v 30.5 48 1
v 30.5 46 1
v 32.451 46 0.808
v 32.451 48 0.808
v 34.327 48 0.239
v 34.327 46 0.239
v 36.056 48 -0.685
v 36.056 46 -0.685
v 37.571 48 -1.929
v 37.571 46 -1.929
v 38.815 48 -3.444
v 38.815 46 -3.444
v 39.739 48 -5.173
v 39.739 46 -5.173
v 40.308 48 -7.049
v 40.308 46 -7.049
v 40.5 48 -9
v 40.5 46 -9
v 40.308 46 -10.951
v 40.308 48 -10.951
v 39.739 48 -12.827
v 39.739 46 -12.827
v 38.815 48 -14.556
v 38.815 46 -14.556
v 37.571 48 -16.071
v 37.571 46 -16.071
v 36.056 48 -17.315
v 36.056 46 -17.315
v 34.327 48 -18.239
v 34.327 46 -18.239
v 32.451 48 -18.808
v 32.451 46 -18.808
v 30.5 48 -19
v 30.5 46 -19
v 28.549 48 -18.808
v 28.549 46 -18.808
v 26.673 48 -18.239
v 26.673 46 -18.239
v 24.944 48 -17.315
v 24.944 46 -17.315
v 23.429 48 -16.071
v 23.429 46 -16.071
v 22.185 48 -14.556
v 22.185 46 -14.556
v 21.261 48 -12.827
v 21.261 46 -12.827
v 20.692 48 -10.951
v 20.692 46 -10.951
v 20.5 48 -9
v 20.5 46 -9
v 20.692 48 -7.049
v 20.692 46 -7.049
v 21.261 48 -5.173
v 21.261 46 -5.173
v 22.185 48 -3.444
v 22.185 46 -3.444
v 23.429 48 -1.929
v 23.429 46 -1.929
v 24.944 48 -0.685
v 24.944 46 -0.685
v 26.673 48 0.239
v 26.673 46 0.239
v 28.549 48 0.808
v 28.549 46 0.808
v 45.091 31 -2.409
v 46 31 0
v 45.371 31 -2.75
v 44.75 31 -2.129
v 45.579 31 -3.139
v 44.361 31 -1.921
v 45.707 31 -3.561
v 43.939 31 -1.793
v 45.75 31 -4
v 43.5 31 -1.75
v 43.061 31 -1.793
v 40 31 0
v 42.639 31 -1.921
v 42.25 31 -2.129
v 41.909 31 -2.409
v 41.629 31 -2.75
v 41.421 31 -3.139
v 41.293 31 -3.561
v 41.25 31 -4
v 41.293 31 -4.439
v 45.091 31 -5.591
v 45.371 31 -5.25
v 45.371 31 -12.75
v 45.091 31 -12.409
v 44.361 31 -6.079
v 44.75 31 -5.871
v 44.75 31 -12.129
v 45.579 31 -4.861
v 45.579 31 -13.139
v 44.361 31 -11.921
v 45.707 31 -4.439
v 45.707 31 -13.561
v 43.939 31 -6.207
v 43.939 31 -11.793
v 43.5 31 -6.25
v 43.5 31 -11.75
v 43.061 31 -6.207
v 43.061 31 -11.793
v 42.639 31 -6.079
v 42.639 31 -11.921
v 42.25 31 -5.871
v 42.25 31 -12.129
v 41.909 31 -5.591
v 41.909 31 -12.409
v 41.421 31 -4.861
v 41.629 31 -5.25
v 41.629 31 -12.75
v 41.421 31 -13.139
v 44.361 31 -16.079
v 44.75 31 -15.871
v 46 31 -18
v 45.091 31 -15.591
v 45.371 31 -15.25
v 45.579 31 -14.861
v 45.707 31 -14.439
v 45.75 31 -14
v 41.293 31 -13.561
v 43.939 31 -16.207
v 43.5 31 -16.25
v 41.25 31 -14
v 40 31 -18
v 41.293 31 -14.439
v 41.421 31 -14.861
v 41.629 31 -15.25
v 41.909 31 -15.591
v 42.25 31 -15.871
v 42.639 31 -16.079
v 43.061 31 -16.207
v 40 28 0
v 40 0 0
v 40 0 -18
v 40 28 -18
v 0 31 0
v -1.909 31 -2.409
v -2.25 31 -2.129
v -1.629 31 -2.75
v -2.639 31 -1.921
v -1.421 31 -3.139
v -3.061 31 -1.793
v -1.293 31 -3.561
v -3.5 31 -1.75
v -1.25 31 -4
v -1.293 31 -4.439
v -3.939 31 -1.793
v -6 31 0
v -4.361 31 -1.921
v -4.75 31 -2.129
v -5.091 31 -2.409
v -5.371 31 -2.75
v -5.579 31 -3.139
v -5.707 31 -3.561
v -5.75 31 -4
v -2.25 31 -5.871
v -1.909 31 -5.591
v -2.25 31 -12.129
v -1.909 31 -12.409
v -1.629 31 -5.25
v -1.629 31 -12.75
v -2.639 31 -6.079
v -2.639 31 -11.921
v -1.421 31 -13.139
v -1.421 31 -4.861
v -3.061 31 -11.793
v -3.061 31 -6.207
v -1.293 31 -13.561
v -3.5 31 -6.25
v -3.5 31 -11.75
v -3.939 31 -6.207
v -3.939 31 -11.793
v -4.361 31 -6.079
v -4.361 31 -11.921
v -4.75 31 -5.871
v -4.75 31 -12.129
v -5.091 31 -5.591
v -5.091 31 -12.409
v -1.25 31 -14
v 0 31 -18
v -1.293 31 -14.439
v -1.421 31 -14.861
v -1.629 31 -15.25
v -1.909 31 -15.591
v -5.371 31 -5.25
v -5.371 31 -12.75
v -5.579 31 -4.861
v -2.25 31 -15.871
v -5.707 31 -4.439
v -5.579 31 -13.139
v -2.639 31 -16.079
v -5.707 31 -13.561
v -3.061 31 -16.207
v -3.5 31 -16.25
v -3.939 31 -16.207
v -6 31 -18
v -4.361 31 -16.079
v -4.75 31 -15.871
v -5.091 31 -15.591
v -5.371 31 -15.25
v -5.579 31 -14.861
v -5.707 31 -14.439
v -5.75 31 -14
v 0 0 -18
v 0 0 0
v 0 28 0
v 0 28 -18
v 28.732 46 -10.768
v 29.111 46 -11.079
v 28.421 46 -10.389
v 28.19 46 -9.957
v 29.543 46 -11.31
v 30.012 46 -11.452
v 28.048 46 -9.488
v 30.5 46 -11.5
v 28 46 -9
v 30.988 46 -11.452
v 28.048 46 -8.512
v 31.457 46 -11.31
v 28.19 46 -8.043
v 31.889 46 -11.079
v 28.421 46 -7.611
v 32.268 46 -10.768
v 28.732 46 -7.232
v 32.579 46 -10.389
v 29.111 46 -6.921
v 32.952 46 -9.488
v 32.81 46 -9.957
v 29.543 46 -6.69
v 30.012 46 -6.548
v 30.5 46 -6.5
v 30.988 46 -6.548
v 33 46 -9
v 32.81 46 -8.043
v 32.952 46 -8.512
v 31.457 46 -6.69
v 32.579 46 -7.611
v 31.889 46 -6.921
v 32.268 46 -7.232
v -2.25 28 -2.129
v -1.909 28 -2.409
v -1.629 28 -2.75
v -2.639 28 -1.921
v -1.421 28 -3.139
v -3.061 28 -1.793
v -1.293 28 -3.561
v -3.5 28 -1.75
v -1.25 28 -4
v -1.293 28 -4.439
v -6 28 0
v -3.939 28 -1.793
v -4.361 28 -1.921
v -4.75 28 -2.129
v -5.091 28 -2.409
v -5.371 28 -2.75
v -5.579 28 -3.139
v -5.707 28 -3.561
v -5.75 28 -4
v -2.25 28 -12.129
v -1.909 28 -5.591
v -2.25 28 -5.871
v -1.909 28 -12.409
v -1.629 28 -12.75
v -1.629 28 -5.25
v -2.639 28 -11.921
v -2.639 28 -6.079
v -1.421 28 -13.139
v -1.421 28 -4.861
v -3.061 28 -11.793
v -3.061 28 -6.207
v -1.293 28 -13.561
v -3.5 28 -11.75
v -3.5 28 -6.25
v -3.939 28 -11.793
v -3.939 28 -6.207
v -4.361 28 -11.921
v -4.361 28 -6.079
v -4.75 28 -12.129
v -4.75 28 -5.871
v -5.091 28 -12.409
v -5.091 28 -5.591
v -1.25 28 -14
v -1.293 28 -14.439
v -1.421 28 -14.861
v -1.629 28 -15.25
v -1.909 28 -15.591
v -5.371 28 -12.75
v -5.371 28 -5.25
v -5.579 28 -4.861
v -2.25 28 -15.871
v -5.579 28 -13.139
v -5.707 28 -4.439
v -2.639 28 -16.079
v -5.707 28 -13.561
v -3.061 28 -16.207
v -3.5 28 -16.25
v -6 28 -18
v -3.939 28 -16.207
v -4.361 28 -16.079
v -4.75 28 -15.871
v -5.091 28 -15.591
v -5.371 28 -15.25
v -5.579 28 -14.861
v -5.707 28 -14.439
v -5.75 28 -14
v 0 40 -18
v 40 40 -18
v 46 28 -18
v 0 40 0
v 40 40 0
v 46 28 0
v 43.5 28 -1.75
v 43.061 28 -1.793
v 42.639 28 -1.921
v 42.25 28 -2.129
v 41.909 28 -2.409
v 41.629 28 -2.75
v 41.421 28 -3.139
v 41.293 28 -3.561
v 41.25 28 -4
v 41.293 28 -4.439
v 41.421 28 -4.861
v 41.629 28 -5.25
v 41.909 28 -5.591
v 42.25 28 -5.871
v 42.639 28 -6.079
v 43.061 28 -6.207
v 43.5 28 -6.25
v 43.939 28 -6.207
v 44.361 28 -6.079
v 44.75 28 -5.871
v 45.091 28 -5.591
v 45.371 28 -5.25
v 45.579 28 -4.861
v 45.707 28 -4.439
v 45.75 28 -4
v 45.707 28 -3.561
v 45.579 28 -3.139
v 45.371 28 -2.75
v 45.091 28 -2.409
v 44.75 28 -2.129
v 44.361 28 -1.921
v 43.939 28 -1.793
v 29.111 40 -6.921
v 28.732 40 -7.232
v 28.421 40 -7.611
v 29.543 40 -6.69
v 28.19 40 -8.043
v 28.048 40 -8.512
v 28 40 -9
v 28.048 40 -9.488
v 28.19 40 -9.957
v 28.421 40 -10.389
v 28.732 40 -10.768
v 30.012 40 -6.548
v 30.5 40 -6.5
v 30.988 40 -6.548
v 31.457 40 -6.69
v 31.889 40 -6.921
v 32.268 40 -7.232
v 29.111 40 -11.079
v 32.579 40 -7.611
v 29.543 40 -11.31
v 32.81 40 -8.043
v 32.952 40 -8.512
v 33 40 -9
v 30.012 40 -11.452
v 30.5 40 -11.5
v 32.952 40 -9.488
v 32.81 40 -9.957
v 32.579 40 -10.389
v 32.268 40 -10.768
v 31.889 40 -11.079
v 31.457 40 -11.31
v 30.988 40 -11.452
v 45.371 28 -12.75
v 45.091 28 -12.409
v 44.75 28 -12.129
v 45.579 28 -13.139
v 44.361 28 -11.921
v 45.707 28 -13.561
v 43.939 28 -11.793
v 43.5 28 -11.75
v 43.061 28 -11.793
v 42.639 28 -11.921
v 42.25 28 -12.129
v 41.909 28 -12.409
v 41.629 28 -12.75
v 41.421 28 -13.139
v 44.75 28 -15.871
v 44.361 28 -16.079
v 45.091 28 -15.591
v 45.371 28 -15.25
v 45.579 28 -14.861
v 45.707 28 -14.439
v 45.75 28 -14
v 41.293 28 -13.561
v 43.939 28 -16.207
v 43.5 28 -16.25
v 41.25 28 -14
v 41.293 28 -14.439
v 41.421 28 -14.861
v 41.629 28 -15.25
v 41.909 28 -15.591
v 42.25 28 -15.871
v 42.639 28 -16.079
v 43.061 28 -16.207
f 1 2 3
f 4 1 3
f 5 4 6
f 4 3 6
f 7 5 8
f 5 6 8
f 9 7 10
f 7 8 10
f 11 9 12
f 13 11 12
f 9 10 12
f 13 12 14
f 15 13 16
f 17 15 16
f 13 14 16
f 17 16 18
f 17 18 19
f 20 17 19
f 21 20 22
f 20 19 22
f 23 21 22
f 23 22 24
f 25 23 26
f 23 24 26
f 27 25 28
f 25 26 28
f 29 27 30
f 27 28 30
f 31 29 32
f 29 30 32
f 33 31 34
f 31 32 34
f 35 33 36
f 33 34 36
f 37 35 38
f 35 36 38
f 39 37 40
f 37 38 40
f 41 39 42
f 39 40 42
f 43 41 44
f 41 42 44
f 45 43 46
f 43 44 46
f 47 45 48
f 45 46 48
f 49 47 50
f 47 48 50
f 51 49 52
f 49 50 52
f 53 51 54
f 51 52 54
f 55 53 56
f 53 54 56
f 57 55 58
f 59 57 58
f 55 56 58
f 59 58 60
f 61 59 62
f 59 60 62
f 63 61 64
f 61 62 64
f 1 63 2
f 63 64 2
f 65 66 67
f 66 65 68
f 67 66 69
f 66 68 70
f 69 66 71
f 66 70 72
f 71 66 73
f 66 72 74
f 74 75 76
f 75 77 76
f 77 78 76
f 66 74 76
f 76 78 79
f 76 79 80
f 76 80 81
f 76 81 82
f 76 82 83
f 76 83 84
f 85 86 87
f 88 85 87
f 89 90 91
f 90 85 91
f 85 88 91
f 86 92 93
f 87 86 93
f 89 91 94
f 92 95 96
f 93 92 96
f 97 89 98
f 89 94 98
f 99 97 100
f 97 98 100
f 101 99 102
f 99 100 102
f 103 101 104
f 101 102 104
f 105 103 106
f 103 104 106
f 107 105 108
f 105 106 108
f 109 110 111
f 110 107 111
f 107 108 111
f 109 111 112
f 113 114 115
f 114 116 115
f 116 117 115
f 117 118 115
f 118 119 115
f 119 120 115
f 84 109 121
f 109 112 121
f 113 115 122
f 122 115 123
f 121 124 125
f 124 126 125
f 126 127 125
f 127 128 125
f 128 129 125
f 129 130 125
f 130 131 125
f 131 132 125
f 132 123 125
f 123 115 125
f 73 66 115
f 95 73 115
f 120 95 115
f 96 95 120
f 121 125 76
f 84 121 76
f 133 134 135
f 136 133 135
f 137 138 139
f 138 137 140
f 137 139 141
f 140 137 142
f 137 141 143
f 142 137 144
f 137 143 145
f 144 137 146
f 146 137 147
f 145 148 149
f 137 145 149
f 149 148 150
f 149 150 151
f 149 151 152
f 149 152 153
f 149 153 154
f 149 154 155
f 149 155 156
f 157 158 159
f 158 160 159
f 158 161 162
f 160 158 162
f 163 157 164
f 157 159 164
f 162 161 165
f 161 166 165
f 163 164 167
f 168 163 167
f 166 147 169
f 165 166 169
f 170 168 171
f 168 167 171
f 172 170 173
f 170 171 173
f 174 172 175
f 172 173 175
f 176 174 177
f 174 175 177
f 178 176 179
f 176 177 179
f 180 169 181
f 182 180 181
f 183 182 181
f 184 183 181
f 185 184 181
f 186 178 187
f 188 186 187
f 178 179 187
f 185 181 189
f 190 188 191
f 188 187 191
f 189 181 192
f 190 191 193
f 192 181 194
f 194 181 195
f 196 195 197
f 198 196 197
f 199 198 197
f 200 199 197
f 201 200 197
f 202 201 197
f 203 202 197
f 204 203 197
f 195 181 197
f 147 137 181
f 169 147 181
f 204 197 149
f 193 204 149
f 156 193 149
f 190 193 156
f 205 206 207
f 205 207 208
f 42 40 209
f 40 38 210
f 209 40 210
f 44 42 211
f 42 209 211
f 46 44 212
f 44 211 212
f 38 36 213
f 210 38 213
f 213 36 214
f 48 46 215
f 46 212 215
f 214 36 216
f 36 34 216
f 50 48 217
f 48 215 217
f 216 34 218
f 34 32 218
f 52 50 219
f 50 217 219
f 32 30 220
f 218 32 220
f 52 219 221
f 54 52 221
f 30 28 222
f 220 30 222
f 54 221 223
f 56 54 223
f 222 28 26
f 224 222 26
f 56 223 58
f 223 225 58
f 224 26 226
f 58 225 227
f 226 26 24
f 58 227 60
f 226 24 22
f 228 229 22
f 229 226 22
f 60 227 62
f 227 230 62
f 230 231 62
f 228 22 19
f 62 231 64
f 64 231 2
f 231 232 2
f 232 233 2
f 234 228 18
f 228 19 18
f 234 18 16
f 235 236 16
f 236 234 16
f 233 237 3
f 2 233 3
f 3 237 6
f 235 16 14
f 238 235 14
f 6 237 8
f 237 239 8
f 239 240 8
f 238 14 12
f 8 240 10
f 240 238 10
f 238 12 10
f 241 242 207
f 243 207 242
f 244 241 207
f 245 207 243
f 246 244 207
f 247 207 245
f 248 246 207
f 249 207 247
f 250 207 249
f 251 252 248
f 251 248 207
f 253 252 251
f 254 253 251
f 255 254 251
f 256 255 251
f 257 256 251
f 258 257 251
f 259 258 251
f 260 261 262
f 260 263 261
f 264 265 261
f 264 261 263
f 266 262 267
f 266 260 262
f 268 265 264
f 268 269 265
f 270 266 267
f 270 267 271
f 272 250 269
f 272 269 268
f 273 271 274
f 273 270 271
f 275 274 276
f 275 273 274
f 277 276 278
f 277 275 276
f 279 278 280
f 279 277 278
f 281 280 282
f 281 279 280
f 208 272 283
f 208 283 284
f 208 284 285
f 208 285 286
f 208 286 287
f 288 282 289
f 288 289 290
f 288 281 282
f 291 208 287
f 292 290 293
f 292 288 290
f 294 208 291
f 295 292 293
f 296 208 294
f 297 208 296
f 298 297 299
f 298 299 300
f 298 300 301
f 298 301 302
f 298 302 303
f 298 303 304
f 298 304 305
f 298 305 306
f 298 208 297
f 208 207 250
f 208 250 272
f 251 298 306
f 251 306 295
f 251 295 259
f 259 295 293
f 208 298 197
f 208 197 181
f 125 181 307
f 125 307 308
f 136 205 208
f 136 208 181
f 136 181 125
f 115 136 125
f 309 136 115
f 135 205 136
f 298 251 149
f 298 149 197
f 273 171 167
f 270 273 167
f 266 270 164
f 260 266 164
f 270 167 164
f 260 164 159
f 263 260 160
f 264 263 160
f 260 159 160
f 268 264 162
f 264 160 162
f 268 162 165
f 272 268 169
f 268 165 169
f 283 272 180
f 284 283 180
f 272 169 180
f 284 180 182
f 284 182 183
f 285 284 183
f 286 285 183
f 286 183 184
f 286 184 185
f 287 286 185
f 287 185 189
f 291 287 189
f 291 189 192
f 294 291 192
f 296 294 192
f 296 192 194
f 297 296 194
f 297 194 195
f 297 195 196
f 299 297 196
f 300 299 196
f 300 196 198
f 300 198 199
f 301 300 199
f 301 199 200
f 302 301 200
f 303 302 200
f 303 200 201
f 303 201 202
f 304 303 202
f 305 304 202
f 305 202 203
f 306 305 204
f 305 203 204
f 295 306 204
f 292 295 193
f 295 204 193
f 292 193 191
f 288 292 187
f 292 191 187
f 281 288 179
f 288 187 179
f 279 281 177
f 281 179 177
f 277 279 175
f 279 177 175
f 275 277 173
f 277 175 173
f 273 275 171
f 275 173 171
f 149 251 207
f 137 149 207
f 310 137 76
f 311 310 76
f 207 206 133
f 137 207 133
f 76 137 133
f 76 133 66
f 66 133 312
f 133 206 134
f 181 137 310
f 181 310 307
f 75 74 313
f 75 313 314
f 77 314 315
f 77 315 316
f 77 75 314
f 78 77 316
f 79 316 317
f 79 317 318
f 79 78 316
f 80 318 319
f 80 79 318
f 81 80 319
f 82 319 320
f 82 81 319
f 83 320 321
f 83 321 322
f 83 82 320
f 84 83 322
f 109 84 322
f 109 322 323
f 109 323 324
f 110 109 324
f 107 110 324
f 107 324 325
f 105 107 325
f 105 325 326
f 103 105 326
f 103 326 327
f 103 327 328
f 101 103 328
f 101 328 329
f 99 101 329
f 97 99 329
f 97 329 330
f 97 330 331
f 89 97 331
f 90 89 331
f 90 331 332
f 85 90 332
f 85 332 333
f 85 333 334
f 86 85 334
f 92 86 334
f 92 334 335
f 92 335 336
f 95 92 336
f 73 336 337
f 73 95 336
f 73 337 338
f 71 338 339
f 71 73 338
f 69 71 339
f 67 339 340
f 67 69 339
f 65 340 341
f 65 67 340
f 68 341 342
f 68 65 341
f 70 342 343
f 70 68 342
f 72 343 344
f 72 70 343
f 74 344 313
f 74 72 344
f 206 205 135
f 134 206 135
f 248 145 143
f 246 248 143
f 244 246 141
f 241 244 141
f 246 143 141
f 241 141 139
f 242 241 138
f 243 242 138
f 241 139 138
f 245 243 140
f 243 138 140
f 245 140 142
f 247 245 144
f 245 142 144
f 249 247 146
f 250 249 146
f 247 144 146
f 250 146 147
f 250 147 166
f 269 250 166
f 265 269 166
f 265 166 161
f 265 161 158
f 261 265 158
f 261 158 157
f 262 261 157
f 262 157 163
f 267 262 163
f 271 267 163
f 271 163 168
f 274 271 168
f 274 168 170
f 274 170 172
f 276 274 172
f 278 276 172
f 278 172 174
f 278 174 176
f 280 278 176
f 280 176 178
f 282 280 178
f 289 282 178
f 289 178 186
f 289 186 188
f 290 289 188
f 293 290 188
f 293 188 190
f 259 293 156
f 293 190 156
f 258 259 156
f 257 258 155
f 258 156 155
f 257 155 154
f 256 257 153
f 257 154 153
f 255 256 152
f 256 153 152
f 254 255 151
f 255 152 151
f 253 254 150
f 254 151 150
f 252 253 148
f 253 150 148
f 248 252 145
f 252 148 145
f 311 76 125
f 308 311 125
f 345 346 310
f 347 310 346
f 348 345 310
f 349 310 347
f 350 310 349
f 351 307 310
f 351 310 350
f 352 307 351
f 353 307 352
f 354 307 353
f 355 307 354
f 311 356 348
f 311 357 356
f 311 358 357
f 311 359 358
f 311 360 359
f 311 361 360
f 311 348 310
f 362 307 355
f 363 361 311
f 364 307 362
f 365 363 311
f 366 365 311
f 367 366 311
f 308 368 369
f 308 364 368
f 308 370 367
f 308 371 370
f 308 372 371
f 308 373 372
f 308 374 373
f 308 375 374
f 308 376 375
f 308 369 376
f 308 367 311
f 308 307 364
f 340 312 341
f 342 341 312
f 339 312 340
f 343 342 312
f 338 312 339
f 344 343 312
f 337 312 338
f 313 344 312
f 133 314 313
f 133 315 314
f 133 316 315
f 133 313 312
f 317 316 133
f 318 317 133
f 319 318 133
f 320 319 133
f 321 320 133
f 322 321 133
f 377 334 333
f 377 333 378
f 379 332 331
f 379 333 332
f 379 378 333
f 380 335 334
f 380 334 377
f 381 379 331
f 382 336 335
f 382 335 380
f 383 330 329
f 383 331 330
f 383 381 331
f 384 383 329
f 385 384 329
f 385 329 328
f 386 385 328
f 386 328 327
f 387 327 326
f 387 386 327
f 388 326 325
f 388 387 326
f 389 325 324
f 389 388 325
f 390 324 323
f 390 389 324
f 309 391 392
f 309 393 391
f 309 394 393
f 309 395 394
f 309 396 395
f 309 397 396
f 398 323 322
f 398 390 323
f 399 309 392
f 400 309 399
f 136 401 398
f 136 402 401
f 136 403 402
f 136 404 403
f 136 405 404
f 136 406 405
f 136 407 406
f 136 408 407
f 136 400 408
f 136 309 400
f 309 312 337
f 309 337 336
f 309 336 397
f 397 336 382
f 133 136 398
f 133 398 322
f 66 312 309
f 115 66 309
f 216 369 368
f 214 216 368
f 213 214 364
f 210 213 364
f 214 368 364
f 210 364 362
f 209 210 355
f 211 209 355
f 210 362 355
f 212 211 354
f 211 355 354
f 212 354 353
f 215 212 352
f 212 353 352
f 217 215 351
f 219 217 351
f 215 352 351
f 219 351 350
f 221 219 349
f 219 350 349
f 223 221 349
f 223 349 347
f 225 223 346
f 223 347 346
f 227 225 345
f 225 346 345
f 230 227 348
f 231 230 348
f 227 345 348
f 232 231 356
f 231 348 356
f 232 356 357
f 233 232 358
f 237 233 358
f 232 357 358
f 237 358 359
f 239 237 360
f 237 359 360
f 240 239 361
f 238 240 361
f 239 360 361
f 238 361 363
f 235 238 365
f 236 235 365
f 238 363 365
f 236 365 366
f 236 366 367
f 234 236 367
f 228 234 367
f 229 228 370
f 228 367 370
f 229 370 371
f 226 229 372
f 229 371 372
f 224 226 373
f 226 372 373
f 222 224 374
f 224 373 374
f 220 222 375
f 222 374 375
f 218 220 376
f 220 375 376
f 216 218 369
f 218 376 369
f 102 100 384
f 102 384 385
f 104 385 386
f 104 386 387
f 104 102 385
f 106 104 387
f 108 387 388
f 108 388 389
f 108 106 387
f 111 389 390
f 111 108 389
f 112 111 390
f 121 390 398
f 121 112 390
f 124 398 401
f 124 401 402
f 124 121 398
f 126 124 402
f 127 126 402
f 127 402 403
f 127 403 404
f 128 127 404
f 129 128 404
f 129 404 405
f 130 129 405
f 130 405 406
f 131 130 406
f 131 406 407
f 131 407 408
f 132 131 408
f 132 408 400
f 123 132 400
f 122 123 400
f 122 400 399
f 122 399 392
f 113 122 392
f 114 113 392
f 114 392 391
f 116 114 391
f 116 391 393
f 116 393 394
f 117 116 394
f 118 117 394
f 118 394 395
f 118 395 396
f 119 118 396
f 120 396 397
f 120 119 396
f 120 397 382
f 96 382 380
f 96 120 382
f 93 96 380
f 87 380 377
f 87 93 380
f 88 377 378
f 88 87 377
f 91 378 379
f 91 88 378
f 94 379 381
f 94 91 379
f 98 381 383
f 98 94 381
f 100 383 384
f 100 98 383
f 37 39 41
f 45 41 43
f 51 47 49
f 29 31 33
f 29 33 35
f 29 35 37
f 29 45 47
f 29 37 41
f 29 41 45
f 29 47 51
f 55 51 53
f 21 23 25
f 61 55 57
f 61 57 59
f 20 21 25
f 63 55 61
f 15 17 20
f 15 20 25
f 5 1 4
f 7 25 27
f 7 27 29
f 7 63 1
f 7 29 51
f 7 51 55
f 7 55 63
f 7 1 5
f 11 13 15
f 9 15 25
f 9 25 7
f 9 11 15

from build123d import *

# Parameters (mm, degrees)
SKETCH1_W           = 40
SKETCH1_H           = 18
BOSS_EXTRUDE1_DEPTH = 40
SKETCH2_W           = 6
SKETCH2_H           = 18
BOSS_EXTRUDE2_DEPTH = 3
SKETCH3_R           = 2.5
BOSS_EXTRUDE3_DEPTH = 6
SKETCH4_R           = 10
BOSS_EXTRUDE4_DEPTH = 2
CUT_EXTRUDE1_REACH  = 60.634
SKETCH5_R           = 2.25


with BuildPart() as part:
    # Sketch1 → Boss-Extrude1 (new body)
    with BuildSketch(Plane(origin=(0, 0, 0), x_dir=(1, 0, 0), z_dir=(0, 1, 0))):
        with Locations((20, 9)):
            Rectangle(SKETCH1_W, SKETCH1_H)
    extrude(amount=BOSS_EXTRUDE1_DEPTH)

    # Sketch2 → Boss-Extrude2 (add)
    with BuildSketch(Plane(origin=(0, 28, 0), x_dir=(-1, 0, 0), z_dir=(0, -1, 0))):
        with Locations((3, 9)):
            Rectangle(SKETCH2_W, SKETCH2_H)
        with Locations((-43, 9)):
            Rectangle(SKETCH2_W, SKETCH2_H)
    extrude(amount=-BOSS_EXTRUDE2_DEPTH)

    # Sketch3 → Boss-Extrude3 (add)
    with BuildSketch(Plane(origin=(0, 40, 0), x_dir=(1, 0, 0), z_dir=(0, 1, 0))):
        with Locations(Location((30.5, 9, 0), (0, 0, 90))):
            Circle(SKETCH3_R)
    extrude(amount=BOSS_EXTRUDE3_DEPTH)

    # Sketch4 → Boss-Extrude4 (add)
    with BuildSketch(Plane(origin=(0, 46, 0), x_dir=(1, 0, 0), z_dir=(0, 1, 0))):
        with Locations(Location((30.5, 9, 0), (0, 0, 270))):
            Circle(SKETCH4_R)
    extrude(amount=BOSS_EXTRUDE4_DEPTH)

    # Sketch5 → Cut-Extrude1 (cut, up to next)
    with BuildSketch(Plane(origin=(0, 31, 0), x_dir=(1, 0, 0), z_dir=(0, 1, 0)), mode=Mode.PRIVATE) as cut_extrude1_sk1:
        with Locations(Location((-3.5, 14, 0), (0, 0, 270))):
            Circle(SKETCH5_R)
    cut_extrude1_tool1 = extrude(cut_extrude1_sk1.sketch, amount=-CUT_EXTRUDE1_REACH, mode=Mode.PRIVATE) & part.part
    # Sketch5 → Cut-Extrude1 (cut, up to next)
    with BuildSketch(Plane(origin=(0, 31, 0), x_dir=(1, 0, 0), z_dir=(0, 1, 0)), mode=Mode.PRIVATE) as cut_extrude1_sk2:
        with Locations(Location((-3.5, 4, 0), (0, 0, 270))):
            Circle(SKETCH5_R)
    cut_extrude1_tool2 = extrude(cut_extrude1_sk2.sketch, amount=-CUT_EXTRUDE1_REACH, mode=Mode.PRIVATE) & part.part
    cut_extrude1_1 = cut_extrude1_tool1.solids().sort_by_distance((-3.5, 31, -14))[0]
    add(cut_extrude1_1, mode=Mode.SUBTRACT)
    cut_extrude1_2 = cut_extrude1_tool2.solids().sort_by_distance((-3.5, 31, -4))[0]
    add(cut_extrude1_2, mode=Mode.SUBTRACT)
    cut_extrude1 = cut_extrude1_1 + cut_extrude1_2  # Cut-Extrude1 as one shape, for the pattern or mirror that repeats it

    # Mirror1: Cut-Extrude1 across plane
    add(cut_extrude1.mirror(Plane.ZY.offset(-20)), mode=Mode.SUBTRACT)


solid = part.part
